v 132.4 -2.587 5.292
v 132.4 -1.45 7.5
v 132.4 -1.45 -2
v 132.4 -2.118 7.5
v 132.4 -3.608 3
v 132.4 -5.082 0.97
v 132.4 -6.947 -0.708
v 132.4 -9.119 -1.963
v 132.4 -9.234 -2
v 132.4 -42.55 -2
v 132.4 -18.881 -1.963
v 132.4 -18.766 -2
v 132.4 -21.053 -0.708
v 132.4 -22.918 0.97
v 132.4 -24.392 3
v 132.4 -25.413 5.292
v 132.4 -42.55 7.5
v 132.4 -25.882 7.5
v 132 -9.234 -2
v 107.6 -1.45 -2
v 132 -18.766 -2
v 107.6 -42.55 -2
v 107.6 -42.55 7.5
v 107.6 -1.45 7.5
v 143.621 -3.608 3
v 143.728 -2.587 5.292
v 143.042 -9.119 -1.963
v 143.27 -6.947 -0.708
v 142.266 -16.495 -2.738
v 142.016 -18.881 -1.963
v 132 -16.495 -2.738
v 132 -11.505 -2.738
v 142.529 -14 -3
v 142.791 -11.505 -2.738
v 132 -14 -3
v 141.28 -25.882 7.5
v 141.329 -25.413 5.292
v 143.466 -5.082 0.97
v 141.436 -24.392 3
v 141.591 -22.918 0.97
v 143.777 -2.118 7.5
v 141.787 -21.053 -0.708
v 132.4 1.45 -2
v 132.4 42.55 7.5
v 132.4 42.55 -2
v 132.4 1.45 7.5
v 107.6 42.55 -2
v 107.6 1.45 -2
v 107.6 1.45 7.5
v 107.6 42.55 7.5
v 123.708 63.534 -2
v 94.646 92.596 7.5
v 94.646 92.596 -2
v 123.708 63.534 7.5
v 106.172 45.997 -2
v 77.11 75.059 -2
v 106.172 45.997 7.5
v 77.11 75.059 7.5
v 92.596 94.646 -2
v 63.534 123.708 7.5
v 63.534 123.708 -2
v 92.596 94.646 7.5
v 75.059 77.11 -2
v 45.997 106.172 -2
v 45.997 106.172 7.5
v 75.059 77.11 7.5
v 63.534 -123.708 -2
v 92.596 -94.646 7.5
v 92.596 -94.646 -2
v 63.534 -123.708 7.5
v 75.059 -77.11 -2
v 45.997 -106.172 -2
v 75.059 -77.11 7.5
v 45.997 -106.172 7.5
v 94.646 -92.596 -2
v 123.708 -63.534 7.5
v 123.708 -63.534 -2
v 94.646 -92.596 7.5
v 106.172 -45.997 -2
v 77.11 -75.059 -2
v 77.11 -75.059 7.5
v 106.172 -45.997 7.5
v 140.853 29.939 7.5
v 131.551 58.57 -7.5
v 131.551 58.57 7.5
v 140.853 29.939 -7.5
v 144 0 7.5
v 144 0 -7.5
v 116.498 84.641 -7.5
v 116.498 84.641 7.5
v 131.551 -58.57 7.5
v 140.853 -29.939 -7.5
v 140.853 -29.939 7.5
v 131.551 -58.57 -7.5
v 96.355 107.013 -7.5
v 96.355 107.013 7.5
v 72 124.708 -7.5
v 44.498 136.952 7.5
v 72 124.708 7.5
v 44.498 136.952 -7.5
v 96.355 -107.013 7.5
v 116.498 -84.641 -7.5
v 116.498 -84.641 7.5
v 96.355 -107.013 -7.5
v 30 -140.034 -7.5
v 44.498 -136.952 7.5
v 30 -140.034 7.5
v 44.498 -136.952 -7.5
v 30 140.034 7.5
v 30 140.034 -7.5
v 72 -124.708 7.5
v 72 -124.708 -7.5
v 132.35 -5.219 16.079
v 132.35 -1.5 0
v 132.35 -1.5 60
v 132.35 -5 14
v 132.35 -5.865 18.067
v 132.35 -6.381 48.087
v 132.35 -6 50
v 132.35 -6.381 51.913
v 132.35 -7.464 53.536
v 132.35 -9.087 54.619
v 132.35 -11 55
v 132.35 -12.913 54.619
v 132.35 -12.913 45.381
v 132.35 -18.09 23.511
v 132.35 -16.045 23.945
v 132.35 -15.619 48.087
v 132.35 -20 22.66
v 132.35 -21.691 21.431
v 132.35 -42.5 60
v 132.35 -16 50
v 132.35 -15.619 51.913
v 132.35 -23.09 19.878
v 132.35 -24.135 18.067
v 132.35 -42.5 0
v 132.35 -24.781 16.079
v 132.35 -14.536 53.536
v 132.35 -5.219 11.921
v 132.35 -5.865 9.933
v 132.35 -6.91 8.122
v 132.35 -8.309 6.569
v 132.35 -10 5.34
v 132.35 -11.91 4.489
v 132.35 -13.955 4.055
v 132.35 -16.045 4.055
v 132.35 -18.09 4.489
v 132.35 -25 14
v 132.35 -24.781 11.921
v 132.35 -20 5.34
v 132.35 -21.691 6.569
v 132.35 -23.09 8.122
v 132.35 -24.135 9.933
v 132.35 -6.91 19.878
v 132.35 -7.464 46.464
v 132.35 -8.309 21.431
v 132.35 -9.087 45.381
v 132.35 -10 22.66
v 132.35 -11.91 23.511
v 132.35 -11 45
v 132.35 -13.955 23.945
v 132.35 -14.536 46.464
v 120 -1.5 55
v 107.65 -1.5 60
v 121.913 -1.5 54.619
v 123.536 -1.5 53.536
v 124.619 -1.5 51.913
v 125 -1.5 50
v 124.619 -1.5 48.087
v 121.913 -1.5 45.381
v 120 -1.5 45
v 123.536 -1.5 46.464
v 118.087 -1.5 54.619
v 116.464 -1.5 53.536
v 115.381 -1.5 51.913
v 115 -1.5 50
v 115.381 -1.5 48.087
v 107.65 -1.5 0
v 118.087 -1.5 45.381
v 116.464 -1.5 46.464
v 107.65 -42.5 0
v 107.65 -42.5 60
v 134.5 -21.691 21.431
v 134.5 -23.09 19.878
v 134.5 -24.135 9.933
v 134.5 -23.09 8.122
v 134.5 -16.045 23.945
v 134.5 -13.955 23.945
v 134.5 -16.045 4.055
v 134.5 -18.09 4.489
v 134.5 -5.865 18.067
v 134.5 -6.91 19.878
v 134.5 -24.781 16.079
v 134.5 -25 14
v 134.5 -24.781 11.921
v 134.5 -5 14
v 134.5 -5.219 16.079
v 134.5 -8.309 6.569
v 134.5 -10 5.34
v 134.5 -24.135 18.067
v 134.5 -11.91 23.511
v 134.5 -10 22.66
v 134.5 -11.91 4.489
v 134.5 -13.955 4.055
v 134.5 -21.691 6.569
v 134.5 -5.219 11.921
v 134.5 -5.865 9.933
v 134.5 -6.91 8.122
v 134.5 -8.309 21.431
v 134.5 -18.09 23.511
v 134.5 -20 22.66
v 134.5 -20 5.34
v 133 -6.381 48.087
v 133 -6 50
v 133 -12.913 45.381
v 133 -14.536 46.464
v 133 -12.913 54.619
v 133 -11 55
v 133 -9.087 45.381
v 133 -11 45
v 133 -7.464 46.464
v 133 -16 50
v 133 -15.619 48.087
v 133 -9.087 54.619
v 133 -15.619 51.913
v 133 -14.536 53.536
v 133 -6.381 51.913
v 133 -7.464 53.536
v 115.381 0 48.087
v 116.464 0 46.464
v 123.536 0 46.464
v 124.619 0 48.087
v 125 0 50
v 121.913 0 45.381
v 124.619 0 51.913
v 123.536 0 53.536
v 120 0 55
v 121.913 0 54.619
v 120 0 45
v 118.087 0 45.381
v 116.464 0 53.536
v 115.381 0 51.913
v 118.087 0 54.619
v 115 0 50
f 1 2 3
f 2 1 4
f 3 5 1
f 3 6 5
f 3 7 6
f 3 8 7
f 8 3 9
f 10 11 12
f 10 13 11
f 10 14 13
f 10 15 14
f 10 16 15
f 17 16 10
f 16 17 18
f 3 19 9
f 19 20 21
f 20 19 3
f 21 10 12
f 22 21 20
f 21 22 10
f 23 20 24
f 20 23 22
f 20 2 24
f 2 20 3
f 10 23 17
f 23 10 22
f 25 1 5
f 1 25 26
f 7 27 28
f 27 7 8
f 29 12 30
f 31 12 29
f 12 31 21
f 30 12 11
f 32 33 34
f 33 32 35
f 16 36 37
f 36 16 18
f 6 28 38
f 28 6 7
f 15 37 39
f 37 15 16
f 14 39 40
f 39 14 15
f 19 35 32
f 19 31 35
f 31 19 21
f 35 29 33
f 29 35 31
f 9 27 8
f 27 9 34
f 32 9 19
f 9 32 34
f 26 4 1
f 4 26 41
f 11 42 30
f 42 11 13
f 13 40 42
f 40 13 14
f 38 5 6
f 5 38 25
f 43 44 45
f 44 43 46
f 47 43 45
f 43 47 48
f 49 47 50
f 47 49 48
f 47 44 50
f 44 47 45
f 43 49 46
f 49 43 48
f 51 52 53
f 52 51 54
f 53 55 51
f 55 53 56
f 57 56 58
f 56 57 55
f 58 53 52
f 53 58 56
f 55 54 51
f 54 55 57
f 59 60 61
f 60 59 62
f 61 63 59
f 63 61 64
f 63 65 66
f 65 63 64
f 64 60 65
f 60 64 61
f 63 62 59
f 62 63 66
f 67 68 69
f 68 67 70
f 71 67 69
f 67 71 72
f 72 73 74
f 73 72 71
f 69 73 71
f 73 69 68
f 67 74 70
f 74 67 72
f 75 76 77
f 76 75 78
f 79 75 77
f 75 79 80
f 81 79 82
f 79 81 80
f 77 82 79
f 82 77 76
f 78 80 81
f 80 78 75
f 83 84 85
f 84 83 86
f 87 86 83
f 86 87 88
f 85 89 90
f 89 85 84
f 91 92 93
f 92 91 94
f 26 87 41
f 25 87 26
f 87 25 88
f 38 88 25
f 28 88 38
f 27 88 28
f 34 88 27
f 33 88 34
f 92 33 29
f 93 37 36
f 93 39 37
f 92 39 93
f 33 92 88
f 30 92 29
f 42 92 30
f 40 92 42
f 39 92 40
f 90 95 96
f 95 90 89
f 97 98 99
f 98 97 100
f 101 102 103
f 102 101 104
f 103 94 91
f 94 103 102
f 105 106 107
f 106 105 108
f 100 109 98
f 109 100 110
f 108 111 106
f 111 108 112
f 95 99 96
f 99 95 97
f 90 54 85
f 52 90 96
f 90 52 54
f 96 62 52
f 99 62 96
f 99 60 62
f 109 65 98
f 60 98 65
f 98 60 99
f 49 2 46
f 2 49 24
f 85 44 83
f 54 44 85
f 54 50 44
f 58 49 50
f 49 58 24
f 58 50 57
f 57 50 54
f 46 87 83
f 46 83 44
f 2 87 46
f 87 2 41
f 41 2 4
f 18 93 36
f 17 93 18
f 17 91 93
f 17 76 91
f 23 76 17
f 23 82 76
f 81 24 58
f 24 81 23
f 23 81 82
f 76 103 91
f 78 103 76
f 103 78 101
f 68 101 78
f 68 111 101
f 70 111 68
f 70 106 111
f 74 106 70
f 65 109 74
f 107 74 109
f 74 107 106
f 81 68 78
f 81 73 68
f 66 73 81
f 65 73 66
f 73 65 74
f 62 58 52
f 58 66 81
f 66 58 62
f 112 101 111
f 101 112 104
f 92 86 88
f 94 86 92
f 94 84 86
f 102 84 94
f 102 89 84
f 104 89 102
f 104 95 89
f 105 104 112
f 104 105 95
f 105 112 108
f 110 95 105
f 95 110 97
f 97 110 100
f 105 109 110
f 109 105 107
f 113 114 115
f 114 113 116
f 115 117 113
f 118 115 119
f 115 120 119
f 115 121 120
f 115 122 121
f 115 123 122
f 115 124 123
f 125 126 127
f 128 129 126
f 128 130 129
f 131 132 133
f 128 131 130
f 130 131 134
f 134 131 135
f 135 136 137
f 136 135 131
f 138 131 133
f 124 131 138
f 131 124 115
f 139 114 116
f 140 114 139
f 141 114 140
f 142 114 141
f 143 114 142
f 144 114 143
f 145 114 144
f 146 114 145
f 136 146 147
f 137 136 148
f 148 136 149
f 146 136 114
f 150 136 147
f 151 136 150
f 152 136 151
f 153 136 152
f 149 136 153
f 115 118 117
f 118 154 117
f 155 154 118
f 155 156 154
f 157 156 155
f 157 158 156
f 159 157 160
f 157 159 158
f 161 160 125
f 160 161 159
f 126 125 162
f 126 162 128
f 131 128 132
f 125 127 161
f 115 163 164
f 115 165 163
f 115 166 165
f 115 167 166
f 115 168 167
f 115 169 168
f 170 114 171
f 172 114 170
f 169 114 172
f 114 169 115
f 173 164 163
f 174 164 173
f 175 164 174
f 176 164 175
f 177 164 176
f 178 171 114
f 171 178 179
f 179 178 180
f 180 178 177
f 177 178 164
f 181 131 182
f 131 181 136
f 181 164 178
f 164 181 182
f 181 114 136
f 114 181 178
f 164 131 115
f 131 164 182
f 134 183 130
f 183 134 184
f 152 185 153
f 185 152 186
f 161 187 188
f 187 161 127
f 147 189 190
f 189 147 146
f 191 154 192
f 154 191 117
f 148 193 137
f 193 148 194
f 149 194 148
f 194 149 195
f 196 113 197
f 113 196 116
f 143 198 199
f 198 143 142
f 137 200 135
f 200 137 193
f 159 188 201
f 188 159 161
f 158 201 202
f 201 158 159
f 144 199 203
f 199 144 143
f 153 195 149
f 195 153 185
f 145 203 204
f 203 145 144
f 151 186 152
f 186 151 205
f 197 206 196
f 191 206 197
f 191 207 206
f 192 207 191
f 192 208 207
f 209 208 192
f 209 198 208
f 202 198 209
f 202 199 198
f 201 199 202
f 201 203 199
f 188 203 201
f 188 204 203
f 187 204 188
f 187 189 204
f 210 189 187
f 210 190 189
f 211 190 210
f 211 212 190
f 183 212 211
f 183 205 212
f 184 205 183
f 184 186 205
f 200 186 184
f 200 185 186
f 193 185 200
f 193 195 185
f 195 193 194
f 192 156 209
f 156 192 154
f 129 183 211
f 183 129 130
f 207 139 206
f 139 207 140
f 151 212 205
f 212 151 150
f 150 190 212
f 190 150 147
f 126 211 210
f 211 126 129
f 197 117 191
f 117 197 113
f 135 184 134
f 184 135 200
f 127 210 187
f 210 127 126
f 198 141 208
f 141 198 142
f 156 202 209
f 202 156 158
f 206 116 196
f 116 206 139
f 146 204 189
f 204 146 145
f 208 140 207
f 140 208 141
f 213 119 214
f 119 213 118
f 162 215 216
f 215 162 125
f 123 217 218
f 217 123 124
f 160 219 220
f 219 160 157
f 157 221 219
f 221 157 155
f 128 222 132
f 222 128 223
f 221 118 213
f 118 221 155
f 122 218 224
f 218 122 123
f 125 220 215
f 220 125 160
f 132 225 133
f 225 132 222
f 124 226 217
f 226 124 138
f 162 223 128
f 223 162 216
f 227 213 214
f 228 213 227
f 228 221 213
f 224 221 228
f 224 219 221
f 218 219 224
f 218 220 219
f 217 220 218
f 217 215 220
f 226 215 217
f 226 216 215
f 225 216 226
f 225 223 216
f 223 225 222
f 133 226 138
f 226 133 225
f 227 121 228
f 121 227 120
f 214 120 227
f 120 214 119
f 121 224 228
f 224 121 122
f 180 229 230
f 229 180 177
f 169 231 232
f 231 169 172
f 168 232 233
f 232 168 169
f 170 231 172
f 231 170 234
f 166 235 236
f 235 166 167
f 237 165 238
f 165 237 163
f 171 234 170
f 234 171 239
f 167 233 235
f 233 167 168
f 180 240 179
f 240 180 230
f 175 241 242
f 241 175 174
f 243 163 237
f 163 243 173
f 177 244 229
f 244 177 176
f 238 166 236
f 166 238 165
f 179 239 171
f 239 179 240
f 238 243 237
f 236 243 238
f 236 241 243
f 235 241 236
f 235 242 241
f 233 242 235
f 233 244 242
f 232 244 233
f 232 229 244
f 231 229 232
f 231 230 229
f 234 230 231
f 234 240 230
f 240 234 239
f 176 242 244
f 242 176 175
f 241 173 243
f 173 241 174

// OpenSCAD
// trench dimensions
width = 41.1;
length = 24.8;
depth = 10;
affine = 3; // shift up z direction

right = -22; // right eye offset
left = 22; // left eye offset

distance = 120; //distance from optical center


difference(){

    // apparatus
    cylinder(h = 15, r = 1.2 * distance, center = true);

    translate([-60, 0, 0])
    cube(size = [1.5 * distance, 2.5 * distance, 20], center = true);

    // trenches for stereo pair of cameras
    union(){
        translate([distance, right, affine])
        cube(size = [length, width, depth], center = true);

        translate([distance + 20, right + 8, affine + 6])
        rotate([0, 90, 0])
        cylinder(h = 16, r = 12, center = true);

        translate([distance, left, affine])
        cube(size = [length, width, depth], center = true);
    }

    rotate([0, 0, 45])
    union(){
    translate([distance, right, affine])
    cube(size = [length, width, depth], center = true);

    translate([distance, left, affine])
    cube(size = [length, width, depth], center = true);
    }

    rotate([0, 0, -45])
    union(){
    translate([distance, right, affine])
    cube(size = [length, width, depth], center = true);

    translate([distance, left, affine])
    cube(size = [length, width, depth], center = true);
    }

    }

    translate([distance, right, 30])
    rotate([-90, 0, 0])
    union(){ // sj400cam
    // camera body
    color("dimgray")
    cube(size = [24.7, 60, 41], center = true);

    // lens
    color("deepskyblue")
    translate([12, 16, 7])
    rotate([0,90,0])
    cylinder(h = 5, r = 10, center = true);

    // power button
    color("gray")
    translate([12, -20, 11])
    rotate([0,90,0])
    cylinder(h = 2, r = 5, center = true);

    // ok button
    color("gray")
    translate([0, -20, 21])
    cylinder(h = 2, r = 5, center = true);
    }
